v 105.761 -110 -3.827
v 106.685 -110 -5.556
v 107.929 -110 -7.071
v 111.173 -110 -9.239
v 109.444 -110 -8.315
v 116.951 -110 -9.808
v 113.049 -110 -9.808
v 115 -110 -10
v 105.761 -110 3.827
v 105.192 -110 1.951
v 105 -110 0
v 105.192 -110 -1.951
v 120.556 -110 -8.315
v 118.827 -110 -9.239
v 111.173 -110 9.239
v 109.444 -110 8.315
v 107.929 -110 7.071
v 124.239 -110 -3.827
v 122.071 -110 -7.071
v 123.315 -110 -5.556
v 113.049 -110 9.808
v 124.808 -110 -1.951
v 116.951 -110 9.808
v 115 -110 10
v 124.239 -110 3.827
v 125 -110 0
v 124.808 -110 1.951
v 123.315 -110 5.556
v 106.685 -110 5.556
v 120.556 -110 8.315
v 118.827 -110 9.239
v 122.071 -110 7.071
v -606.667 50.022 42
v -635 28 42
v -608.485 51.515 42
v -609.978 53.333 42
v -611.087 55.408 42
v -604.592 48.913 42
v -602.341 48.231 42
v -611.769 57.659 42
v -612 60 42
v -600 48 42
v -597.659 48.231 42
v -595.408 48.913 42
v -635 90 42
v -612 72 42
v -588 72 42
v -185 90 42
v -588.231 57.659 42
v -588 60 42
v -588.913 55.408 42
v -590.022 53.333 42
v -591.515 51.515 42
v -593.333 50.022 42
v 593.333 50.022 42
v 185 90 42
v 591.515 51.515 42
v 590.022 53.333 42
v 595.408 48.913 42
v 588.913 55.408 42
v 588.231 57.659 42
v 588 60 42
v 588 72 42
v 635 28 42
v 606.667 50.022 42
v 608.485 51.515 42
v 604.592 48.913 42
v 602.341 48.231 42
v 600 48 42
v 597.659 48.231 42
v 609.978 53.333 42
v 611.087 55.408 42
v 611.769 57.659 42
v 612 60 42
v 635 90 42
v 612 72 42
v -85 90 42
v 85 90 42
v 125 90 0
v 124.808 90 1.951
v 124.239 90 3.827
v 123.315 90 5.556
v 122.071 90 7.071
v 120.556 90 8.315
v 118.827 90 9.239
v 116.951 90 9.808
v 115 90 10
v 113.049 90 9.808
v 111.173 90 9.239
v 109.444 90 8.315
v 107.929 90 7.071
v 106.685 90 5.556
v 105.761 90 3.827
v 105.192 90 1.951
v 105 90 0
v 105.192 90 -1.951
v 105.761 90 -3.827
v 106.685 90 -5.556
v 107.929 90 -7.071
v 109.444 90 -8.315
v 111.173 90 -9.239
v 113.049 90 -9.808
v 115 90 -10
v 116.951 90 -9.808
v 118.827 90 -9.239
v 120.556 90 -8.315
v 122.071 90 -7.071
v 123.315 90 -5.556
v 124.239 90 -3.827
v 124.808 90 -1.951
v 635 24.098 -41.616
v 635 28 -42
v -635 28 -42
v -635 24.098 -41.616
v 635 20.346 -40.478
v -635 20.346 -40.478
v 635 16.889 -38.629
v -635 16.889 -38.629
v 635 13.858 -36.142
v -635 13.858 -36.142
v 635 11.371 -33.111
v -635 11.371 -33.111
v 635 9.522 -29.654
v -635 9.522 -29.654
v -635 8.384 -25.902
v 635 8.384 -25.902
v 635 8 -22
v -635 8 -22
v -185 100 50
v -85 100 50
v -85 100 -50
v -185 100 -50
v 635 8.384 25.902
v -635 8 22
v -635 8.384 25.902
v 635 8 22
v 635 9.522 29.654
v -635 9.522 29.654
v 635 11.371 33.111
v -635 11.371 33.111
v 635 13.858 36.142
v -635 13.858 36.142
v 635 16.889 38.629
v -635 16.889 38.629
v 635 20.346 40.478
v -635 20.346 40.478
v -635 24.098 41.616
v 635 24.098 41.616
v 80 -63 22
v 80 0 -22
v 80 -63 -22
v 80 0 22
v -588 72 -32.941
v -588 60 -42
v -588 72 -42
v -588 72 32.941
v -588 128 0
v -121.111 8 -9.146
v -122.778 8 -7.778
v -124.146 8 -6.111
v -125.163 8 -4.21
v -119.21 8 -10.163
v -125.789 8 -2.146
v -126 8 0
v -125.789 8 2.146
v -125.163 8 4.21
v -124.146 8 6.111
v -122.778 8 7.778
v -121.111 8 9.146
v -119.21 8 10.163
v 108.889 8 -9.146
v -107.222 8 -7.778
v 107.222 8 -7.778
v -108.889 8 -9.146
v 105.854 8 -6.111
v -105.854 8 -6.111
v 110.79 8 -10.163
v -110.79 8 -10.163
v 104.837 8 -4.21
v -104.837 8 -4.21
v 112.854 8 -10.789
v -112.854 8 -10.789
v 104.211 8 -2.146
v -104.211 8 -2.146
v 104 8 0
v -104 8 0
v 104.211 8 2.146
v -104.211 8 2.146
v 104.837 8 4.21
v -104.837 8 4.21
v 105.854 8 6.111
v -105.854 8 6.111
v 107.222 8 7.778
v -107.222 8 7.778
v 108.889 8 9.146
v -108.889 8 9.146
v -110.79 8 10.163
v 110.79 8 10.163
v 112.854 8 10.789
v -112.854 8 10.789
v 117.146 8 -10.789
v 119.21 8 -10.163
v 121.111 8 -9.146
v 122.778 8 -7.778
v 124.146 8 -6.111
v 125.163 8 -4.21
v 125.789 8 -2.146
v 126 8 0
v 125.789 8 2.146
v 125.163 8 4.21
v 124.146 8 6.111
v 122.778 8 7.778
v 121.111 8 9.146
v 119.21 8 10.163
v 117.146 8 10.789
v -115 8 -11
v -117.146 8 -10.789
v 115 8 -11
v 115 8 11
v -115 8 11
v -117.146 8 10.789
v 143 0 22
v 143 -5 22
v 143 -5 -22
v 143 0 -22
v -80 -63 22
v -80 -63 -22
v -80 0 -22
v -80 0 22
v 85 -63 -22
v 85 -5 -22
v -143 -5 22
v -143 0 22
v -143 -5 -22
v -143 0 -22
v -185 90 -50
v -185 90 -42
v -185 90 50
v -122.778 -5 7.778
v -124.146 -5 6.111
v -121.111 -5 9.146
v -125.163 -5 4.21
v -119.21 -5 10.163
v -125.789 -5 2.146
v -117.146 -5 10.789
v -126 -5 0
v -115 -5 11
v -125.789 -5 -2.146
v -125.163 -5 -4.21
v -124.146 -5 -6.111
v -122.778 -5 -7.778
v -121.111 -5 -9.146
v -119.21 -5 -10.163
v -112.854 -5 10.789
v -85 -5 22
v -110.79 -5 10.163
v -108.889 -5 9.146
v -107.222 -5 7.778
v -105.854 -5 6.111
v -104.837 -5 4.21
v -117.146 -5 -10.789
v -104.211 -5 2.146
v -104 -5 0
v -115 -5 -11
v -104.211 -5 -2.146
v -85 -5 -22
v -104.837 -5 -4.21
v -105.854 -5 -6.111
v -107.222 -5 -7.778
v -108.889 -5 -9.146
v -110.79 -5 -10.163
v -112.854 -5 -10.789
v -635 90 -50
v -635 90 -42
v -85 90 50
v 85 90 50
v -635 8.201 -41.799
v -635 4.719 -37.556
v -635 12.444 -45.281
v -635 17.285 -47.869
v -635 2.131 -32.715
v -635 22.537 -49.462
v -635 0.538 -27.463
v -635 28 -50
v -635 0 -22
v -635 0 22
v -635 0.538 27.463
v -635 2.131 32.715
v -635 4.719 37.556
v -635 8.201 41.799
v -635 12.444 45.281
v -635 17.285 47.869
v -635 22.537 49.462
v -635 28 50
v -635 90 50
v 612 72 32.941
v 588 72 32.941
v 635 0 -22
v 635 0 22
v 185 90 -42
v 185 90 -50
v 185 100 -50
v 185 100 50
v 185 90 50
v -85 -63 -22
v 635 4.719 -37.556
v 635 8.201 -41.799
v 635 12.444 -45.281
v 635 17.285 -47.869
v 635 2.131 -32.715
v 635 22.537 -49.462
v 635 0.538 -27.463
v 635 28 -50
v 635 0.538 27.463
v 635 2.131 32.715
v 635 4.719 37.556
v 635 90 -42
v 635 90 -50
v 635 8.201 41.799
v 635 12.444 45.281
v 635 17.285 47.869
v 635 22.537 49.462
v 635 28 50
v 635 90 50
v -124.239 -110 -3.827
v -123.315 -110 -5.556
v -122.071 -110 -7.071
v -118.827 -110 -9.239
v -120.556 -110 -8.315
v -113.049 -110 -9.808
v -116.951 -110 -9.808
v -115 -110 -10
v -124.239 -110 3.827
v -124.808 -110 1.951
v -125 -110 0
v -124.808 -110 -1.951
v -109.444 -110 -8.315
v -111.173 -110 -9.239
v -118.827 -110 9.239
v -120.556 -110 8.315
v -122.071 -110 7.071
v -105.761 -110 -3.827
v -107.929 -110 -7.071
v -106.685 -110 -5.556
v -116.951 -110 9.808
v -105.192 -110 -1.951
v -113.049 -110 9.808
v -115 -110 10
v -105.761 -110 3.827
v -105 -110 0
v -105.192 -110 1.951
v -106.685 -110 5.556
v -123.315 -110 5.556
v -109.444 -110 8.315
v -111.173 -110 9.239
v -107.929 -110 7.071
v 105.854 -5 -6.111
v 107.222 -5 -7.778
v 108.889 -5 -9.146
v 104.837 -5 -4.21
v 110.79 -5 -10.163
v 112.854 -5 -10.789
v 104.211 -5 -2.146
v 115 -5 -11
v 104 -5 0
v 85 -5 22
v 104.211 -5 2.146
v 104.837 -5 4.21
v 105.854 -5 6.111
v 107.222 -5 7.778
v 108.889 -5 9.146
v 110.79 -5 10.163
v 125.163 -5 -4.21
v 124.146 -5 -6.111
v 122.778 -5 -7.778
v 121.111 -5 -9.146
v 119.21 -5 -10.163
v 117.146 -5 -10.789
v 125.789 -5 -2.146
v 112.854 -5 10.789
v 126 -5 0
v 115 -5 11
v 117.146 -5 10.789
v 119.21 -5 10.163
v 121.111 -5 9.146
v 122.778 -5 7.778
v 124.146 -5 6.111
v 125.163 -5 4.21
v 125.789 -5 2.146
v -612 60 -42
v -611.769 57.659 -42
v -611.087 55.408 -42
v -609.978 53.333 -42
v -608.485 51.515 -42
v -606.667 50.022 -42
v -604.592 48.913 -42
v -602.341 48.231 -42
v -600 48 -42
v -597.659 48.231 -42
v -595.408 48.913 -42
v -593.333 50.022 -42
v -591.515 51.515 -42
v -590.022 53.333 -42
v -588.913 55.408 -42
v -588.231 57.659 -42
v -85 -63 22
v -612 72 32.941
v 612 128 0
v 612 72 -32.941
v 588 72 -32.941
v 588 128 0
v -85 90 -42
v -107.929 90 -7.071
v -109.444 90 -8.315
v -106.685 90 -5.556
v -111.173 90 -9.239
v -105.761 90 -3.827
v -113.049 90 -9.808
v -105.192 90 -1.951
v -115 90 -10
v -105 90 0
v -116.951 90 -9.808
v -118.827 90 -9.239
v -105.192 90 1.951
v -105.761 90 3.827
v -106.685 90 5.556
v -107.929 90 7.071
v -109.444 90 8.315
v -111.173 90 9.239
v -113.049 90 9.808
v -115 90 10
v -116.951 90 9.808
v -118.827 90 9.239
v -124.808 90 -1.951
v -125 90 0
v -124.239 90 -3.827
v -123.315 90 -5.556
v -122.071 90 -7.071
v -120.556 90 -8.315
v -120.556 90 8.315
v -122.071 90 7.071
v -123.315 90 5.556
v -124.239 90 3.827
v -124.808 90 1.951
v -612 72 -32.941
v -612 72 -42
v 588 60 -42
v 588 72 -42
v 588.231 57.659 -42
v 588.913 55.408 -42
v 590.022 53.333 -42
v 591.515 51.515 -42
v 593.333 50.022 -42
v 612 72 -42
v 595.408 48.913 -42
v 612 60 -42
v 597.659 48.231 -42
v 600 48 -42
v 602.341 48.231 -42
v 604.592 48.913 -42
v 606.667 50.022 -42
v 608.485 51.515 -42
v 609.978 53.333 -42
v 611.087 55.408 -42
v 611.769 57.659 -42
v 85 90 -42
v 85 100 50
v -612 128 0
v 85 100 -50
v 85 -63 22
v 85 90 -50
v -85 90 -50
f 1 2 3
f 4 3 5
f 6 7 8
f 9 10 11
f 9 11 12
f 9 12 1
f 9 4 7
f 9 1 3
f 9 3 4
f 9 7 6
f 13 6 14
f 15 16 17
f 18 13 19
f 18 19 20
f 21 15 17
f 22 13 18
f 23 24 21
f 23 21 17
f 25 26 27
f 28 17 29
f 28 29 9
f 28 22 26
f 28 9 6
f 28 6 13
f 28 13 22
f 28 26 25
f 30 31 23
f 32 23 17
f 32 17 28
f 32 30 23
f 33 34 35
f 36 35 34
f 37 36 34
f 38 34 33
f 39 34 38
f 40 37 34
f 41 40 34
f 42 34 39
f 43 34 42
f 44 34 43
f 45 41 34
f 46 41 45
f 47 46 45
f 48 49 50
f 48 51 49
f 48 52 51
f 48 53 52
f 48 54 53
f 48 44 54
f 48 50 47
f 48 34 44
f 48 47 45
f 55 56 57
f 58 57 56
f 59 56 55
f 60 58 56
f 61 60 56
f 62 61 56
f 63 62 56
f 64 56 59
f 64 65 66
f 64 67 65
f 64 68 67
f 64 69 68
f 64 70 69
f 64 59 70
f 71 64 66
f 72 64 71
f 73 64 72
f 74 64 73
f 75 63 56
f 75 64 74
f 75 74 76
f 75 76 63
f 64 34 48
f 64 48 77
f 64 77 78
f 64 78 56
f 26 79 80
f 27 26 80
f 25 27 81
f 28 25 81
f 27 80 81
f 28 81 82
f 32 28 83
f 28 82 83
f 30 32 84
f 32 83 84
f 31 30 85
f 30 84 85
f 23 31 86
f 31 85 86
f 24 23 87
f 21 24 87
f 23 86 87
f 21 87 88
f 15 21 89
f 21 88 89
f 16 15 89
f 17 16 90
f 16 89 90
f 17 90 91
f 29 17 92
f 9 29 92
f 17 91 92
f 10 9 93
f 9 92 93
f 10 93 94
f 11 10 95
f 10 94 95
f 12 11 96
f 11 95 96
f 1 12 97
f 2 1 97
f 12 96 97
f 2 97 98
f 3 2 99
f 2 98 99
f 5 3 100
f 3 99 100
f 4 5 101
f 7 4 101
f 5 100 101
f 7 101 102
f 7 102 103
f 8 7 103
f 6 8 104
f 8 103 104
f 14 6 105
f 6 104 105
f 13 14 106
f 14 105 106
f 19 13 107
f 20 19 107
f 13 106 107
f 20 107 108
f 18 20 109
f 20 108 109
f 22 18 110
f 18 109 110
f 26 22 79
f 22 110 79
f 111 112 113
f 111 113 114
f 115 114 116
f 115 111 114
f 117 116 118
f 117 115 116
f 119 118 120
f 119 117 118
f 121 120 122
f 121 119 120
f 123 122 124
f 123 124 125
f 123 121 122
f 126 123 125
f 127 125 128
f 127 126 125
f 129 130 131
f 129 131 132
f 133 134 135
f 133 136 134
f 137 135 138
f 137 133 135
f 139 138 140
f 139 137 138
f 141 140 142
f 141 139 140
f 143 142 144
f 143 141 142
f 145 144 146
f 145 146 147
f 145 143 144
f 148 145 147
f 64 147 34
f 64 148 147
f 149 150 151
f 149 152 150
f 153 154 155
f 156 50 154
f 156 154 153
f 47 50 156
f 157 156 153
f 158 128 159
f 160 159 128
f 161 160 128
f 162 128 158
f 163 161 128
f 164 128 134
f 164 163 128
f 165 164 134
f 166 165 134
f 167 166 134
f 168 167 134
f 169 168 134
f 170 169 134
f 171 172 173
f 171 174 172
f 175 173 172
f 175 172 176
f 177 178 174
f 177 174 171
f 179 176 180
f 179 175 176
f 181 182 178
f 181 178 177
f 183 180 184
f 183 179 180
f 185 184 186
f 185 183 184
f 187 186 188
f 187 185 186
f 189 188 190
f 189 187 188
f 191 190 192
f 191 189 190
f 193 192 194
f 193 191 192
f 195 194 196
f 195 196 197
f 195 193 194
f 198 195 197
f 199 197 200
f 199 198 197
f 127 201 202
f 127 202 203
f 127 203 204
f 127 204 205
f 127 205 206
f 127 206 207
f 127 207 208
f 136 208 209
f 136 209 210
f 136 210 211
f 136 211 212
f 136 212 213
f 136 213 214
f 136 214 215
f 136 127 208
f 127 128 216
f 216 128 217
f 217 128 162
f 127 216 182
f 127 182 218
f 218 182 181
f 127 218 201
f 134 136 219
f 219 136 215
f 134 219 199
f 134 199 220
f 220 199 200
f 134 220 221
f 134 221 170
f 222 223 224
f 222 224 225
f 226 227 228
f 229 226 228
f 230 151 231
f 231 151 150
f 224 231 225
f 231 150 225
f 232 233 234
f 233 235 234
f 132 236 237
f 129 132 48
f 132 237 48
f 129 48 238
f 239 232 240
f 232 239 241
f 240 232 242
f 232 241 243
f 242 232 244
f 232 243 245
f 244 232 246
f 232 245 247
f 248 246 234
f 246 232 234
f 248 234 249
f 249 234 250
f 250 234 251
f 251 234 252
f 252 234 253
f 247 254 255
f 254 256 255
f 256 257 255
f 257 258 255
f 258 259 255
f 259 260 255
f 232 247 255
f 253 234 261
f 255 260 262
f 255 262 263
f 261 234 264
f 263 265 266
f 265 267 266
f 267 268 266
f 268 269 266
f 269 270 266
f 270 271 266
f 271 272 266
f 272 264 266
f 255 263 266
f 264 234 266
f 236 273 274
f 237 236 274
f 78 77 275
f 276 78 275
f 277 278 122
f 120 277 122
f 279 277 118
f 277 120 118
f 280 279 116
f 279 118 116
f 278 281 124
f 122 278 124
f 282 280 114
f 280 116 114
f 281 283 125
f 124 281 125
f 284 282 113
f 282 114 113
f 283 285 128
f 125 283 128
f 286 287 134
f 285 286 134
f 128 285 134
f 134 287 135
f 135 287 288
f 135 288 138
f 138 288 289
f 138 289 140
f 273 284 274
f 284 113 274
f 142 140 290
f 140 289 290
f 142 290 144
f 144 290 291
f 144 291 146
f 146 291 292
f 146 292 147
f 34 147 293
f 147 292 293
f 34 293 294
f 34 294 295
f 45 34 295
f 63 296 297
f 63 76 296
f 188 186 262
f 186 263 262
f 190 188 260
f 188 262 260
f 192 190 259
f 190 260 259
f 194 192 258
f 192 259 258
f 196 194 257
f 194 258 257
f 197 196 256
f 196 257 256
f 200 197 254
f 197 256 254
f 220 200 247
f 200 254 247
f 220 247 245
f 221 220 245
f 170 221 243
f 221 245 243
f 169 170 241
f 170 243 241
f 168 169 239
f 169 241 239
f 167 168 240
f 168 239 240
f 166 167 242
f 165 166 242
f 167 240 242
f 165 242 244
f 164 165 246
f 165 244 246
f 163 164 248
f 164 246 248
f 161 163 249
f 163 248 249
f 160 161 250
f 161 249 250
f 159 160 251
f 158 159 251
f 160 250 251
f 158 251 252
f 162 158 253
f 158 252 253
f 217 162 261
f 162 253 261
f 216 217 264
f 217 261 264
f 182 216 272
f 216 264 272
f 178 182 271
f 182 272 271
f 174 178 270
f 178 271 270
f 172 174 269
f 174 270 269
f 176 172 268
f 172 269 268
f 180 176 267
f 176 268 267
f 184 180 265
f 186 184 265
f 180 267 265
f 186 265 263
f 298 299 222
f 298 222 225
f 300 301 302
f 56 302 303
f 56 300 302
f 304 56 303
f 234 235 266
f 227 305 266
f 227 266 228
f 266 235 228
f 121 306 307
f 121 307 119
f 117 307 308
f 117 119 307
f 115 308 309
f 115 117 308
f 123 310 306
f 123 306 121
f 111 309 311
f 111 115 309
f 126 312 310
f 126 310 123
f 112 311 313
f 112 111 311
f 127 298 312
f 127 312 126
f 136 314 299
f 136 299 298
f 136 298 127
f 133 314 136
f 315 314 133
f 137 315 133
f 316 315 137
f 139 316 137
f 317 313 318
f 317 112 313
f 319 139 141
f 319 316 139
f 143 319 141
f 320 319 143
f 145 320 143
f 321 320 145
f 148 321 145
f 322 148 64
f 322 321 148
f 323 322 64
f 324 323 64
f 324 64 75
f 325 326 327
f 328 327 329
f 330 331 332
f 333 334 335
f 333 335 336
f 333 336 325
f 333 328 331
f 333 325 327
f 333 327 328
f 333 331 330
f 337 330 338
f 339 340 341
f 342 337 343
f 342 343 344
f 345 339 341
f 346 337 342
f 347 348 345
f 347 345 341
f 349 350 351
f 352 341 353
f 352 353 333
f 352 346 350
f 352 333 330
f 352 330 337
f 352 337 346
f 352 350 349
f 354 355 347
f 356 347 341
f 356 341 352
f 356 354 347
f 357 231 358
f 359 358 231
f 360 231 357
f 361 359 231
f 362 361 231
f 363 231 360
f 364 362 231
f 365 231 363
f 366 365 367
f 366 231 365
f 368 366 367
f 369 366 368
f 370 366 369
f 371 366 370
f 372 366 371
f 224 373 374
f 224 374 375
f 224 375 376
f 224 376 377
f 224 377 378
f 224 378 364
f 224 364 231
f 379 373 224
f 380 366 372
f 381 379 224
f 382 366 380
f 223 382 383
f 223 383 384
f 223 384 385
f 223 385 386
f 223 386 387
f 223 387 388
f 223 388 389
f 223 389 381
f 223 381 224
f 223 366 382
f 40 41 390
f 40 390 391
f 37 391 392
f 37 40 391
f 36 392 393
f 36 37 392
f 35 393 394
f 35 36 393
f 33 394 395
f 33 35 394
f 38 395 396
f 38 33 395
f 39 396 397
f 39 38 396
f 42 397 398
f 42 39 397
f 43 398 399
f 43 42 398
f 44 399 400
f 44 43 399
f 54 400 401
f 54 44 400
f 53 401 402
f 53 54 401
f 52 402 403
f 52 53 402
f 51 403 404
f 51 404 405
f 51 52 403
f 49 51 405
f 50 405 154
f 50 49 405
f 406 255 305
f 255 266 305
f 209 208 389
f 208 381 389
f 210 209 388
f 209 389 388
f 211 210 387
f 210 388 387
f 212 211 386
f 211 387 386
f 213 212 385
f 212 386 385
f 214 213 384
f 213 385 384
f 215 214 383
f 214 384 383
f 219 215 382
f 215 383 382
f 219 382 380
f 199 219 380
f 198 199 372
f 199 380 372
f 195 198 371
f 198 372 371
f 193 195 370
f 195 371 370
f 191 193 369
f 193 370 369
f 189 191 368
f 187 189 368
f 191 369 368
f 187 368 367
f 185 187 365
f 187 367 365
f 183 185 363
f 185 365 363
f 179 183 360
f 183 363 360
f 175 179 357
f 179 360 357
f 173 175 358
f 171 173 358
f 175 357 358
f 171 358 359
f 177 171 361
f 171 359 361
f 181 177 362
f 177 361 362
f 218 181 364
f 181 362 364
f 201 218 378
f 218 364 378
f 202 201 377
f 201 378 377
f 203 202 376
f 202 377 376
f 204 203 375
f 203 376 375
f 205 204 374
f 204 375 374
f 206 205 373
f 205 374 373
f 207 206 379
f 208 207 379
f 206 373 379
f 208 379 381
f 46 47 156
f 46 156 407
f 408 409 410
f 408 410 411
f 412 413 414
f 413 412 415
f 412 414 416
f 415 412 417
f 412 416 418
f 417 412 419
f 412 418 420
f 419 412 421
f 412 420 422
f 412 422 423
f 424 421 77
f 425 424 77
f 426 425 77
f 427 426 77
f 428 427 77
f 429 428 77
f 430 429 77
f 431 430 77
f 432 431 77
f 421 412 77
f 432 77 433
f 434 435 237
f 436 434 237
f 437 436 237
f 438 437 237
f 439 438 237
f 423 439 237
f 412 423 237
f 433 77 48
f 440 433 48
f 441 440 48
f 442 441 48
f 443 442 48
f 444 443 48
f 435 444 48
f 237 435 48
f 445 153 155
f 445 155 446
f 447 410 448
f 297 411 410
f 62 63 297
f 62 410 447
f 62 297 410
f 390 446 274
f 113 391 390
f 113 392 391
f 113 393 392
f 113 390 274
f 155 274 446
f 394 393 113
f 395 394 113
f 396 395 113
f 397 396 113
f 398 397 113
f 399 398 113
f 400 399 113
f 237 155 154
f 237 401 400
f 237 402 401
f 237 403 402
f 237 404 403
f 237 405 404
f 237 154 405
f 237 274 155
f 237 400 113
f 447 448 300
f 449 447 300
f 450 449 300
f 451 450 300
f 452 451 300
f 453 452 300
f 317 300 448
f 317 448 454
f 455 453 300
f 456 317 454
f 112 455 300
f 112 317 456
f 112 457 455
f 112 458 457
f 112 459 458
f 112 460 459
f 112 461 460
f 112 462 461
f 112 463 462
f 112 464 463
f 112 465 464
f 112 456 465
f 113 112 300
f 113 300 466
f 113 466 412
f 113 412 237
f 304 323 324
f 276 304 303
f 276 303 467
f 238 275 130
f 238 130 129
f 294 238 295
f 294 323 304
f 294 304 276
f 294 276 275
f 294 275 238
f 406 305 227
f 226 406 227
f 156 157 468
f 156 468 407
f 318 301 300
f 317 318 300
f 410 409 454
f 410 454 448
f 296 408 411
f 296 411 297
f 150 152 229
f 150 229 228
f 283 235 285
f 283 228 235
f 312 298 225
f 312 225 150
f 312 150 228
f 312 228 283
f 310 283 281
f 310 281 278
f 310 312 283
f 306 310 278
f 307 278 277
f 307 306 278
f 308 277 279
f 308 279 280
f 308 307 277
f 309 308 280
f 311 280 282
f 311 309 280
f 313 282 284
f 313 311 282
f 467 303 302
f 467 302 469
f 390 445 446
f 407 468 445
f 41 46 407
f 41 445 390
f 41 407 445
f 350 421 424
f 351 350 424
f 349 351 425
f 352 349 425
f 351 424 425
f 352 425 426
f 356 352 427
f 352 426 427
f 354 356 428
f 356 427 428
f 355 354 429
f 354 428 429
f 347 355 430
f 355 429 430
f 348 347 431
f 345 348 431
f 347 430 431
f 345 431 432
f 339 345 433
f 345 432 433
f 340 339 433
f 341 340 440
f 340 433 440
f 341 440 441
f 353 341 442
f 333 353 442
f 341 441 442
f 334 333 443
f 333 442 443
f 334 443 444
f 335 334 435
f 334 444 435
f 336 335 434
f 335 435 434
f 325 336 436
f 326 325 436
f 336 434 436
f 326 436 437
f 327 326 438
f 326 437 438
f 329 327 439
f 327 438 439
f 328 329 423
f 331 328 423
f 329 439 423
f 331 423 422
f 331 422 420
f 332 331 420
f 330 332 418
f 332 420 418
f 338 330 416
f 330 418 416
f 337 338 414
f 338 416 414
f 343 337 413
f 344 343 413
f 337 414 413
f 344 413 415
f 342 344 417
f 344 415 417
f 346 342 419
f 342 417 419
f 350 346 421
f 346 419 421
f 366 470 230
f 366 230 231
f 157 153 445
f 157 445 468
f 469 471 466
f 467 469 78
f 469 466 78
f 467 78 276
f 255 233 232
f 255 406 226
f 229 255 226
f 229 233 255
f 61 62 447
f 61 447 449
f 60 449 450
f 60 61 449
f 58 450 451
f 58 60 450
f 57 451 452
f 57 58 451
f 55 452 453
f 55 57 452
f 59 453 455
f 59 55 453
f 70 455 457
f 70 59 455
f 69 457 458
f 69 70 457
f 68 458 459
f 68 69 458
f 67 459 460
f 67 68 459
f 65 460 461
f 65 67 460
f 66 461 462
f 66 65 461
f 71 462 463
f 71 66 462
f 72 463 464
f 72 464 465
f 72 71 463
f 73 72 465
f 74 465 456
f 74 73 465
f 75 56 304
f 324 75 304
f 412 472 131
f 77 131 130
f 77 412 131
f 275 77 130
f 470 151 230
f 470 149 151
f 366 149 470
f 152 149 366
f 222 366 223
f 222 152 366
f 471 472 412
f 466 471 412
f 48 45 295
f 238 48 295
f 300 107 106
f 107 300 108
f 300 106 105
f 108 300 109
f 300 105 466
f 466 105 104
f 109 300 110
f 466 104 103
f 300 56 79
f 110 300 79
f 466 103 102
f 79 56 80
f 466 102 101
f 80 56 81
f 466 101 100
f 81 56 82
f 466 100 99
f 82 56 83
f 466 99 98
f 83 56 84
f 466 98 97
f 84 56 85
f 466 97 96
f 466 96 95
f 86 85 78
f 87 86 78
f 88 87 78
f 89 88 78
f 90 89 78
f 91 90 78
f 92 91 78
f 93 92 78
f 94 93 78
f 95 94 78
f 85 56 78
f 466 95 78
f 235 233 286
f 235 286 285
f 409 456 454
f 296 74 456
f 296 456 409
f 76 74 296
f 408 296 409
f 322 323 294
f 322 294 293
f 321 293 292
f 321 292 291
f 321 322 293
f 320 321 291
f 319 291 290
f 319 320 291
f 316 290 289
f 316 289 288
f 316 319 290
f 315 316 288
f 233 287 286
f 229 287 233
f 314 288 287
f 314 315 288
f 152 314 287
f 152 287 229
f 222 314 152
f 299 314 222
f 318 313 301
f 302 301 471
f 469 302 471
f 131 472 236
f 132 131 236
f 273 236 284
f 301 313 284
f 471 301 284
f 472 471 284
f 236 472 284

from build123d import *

# Parameters (mm, degrees)
F1_DEPTH       = 635
F3_DEPTH       = 22
F4_W           = 100
F4_H           = 100
F5_DEPTH       = 10
F6_R           = 11
F7_DEPTH       = 8
F7_DEPTH_BACK  = 63.001
F9_DEPTH       = 50
F9_DEPTH_BACK  = 50
F10_R          = 10
F11_DEPTH      = 200
F14_DEPTH      = 12
F14_DEPTH_BACK = 12
F17_DEPTH      = 12
F17_DEPTH_BACK = 12


with BuildPart() as f1:
    # F0 (on Right) → F1 (new body, symmetric)
    with BuildSketch(Plane.YZ):
        with BuildLine():
            Line((90, 42), (90, 50))
            Line((90, 50), (28, 50))
            ThreePointArc((28, 50), (8.2010101268, 41.7989898732), (0, 22))
            Line((0, 22), (0, -22))
            ThreePointArc((0, -22), (8.2010101268, -41.7989898732), (28, -50))
            Line((28, -50), (90, -50))
            Line((90, -50), (90, -42))
            Line((90, -42), (28, -42))
            ThreePointArc((28, -42), (13.8578643763, -36.1421356237), (8, -22))
            Line((8, -22), (8, 22))
            ThreePointArc((8, 22), (13.8578643763, 36.1421356237), (28, 42))
            Line((28, 42), (90, 42))
        make_face()
    extrude(amount=F1_DEPTH, both=True)

    # F2 (on Top) → F3 (join, symmetric)
    with BuildSketch(Plane.XY):
        Polygon((-80, 0), (-143, 0), (-143, -5), (-85, -5), (-85, -63), (-80, -63), align=None)
        Polygon((80, -63), (85, -63), (85, -5), (143, -5), (143, 0), (80, 0), align=None)
    extrude(amount=F3_DEPTH, both=True)

    # F4 (on face) → F5 (join)
    with BuildSketch(Plane(origin=(0, 90, 0), x_dir=(-1, 0, 0), z_dir=(0, 1, 0))):
        with Locations((-135, 0)):
            Rectangle(F4_W, F4_H)
        with Locations((135, 0)):
            Rectangle(F4_W, F4_H)
    extrude(amount=F5_DEPTH)

    # F6 (on Front) → F7 (cut, two sides)
    with BuildSketch(Plane.XZ) as f7_sk:
        with Locations((-115, 0)):
            Circle(F6_R)
        with Locations((115, 0)):
            Circle(F6_R)
    extrude(amount=-F7_DEPTH, mode=Mode.SUBTRACT)
    extrude(f7_sk.sketch, amount=F7_DEPTH_BACK, mode=Mode.SUBTRACT)

    # F8 (on Top) → F9 (join, two sides)
    with BuildSketch(Plane.XY) as f9_sk:
        with BuildLine():
            Line((-612, 72), (-612, 60))
            ThreePointArc((-612, 60), (-600, 48), (-588, 60))
            Line((-588, 60), (-588, 72))
            Line((-588, 72), (-612, 72))
        make_face()
        with BuildLine():
            ThreePointArc((588, 60), (600, 48), (612, 60))
            Line((612, 60), (612, 72))
            Line((612, 72), (588, 72))
            Line((588, 72), (588, 60))
        make_face()
    extrude(amount=F9_DEPTH)
    extrude(f9_sk.sketch, amount=-F9_DEPTH_BACK)

    # F10 (on face) → F11 (join)
    with BuildSketch(Plane.XZ.offset(-90)):
        with Locations((-115, 0)):
            Circle(F10_R)
        with Locations((115, 0)):
            Circle(F10_R)
    extrude(amount=F11_DEPTH)

    # F13 (on offset) → F14 (join, two sides)
    with BuildSketch(Plane.YZ.offset(600)) as f14_sk:
        Polygon((60, 40), (60, -40), (128, 0), align=None)
    extrude(amount=F14_DEPTH)
    extrude(f14_sk.sketch, amount=-F14_DEPTH_BACK)

    # F16 (on offset) → F17 (join, two sides)
    with BuildSketch(Plane.YZ.offset(-600)) as f17_sk:
        Polygon((60, -40), (128, 0), (60, 40), align=None)
    extrude(amount=F17_DEPTH)
    extrude(f17_sk.sketch, amount=-F17_DEPTH_BACK)


solid = f1.part
